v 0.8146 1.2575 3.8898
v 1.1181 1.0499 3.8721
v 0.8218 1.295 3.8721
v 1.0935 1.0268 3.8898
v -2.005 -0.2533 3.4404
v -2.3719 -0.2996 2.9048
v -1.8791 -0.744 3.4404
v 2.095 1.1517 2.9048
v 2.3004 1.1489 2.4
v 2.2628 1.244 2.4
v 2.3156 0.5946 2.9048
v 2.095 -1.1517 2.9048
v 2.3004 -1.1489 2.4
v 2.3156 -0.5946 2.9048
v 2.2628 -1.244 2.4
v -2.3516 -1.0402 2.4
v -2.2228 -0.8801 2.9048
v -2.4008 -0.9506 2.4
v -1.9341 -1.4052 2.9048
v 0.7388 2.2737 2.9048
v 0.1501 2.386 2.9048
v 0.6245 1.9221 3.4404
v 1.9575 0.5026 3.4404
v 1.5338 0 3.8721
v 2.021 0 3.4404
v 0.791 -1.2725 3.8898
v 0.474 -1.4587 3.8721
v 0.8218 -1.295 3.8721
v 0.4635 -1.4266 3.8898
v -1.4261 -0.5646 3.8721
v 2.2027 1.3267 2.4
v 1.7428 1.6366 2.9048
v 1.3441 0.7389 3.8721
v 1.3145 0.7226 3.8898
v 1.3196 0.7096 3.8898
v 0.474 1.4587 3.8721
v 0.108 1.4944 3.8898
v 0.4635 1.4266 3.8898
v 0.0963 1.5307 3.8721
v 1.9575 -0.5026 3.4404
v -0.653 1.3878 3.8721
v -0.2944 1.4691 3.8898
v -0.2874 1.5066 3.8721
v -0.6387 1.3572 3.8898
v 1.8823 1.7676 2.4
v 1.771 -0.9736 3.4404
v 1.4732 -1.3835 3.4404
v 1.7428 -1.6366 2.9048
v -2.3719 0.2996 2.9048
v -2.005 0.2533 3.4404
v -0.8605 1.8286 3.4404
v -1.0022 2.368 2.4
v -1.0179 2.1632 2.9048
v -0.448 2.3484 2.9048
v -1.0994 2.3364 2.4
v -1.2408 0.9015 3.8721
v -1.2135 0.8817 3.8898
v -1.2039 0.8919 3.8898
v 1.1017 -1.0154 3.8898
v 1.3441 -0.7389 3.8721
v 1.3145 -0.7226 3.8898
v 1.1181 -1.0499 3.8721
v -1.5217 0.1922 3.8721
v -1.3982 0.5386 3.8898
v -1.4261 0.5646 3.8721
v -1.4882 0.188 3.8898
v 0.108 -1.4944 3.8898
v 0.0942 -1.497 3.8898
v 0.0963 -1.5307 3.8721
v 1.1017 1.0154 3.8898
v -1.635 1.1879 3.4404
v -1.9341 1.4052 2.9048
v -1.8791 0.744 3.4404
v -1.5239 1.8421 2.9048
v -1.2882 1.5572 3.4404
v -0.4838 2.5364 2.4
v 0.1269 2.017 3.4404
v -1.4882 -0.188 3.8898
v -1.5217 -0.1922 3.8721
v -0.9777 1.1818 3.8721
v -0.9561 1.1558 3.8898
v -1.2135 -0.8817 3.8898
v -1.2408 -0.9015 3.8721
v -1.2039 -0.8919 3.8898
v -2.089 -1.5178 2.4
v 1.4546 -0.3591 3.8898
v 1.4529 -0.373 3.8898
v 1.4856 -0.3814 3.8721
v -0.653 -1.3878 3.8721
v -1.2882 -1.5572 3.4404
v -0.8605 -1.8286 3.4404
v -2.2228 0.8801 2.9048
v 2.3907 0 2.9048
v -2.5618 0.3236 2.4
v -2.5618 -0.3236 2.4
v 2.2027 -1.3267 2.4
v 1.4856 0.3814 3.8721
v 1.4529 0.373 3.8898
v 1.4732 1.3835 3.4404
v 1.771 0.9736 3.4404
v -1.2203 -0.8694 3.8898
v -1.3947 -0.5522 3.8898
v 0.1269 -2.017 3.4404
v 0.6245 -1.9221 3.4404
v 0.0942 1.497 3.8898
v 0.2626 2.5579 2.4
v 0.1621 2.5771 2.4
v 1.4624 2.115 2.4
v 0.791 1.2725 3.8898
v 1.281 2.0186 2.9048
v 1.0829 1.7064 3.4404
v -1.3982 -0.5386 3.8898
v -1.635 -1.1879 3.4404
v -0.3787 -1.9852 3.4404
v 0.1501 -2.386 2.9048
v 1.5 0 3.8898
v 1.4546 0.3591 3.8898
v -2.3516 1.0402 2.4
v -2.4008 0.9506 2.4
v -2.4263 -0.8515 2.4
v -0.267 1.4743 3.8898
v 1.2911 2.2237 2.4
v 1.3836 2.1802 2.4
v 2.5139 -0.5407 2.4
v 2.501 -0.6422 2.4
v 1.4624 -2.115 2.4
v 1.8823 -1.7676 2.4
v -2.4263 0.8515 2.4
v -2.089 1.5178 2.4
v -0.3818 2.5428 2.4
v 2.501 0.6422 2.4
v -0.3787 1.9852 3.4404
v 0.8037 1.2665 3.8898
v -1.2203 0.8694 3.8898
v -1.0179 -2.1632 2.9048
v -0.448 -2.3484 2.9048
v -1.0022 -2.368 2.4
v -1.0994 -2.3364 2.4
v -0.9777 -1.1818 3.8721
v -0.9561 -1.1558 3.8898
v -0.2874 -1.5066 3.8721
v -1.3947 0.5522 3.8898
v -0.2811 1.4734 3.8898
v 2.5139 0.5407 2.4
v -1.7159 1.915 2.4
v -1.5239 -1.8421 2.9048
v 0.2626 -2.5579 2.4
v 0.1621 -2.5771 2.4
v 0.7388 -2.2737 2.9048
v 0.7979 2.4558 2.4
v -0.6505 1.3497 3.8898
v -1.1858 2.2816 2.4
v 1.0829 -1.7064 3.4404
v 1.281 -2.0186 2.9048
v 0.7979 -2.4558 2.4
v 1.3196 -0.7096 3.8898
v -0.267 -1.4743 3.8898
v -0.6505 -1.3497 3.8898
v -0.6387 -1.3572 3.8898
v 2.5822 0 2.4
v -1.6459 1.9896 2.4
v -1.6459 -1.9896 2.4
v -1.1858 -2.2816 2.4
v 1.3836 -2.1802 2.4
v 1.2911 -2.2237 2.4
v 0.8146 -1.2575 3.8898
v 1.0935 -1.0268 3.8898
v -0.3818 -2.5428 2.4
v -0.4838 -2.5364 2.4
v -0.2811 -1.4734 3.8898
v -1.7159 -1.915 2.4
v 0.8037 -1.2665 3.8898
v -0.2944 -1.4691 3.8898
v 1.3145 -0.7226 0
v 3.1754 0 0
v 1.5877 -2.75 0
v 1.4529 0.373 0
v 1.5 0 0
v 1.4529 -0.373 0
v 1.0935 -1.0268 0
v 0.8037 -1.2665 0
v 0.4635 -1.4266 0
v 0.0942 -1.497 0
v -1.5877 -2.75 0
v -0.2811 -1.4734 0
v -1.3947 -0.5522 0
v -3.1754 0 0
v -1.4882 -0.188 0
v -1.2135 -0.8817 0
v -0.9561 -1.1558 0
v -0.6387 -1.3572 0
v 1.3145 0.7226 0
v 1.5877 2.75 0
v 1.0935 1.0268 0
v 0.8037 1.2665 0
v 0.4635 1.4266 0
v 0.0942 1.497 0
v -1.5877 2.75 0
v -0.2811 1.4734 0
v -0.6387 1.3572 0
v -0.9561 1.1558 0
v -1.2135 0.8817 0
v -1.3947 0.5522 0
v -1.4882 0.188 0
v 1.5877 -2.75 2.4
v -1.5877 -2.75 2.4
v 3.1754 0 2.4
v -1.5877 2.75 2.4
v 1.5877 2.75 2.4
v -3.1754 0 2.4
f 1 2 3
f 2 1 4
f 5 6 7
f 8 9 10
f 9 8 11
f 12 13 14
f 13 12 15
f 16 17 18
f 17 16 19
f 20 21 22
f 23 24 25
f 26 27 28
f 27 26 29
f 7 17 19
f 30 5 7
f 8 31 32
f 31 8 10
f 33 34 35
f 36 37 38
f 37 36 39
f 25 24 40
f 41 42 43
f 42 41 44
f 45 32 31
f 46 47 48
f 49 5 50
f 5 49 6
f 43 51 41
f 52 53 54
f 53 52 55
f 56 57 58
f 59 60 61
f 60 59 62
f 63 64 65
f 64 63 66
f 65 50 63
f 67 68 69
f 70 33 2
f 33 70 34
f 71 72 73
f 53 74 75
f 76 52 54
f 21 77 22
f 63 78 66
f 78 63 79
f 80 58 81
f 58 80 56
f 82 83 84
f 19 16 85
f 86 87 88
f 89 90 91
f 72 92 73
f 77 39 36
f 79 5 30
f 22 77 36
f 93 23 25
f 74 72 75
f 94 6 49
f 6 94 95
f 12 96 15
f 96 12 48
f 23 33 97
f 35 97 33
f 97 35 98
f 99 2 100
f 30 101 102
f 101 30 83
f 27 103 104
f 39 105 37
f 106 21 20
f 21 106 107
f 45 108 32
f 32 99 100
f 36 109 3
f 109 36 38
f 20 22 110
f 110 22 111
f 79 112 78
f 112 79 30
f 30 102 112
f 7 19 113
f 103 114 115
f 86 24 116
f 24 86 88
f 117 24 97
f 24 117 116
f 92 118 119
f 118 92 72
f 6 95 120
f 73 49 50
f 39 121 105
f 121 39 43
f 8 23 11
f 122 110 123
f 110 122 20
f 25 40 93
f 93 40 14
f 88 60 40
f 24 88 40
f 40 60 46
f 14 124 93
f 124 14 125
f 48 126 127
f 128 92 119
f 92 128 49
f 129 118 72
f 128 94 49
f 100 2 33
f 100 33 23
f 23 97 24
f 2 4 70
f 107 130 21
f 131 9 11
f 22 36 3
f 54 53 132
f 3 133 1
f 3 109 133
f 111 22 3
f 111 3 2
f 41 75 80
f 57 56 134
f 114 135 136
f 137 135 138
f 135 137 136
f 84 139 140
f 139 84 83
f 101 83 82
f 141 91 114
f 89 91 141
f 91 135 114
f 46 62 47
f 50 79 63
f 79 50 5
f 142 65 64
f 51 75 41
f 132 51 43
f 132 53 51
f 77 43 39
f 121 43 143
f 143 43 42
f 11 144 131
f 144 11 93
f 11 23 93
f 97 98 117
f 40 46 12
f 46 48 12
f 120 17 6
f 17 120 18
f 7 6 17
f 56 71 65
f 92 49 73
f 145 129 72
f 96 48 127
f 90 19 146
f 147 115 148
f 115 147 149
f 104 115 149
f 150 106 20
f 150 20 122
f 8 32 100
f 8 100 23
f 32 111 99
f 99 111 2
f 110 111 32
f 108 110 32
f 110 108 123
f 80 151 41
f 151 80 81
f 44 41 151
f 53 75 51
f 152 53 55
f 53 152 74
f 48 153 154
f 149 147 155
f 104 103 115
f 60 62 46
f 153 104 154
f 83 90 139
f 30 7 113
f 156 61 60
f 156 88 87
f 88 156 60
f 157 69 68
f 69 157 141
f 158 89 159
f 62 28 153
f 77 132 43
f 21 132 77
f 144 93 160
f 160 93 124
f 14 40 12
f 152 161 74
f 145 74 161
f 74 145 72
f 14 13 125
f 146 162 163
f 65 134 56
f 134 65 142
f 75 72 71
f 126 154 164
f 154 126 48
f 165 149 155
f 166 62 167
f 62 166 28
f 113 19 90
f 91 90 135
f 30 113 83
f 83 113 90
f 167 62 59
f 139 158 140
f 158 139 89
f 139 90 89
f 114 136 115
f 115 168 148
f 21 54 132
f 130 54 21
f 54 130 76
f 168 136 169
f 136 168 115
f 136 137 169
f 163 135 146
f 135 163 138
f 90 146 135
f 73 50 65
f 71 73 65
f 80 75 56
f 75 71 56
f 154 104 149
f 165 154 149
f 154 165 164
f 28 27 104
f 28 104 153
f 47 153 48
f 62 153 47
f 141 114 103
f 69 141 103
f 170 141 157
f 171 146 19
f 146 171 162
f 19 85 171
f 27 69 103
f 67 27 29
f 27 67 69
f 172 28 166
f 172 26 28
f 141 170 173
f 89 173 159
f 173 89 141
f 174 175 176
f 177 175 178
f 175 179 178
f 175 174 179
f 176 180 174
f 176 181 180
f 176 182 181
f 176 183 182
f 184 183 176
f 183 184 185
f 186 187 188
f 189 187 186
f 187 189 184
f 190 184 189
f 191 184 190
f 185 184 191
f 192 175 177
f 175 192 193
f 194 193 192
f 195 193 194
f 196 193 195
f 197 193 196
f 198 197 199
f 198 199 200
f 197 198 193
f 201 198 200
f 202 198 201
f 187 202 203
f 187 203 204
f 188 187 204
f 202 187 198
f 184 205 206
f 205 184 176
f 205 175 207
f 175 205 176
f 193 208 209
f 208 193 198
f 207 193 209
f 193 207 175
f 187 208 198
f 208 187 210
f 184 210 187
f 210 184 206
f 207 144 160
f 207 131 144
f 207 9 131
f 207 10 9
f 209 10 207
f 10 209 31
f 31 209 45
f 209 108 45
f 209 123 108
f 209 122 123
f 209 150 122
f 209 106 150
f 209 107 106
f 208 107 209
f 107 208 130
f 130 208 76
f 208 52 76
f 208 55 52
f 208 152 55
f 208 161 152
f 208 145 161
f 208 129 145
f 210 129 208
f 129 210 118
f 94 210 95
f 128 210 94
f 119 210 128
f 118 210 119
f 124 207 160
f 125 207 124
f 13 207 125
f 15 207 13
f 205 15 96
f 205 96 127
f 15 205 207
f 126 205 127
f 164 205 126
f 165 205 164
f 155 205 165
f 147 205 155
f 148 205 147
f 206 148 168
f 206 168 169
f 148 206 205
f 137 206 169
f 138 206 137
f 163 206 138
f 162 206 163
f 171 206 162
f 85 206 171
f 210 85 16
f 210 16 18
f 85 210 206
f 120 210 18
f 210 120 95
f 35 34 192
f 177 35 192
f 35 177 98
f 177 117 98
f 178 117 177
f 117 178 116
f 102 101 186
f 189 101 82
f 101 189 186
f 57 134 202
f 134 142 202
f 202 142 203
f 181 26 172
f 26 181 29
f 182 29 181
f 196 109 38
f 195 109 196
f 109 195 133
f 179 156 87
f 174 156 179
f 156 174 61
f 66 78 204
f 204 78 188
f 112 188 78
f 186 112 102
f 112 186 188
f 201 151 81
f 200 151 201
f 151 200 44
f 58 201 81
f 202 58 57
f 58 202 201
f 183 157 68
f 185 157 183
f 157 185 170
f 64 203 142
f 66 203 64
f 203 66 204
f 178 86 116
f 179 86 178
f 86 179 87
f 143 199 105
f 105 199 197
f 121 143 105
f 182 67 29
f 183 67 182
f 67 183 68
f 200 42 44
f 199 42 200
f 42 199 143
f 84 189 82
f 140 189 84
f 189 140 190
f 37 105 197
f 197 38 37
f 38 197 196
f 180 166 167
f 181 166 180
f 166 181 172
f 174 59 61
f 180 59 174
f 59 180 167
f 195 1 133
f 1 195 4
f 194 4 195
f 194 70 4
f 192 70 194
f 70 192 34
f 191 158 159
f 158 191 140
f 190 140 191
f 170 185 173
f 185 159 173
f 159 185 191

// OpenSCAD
/* 
    DIN985
*/

$fn = 25;

DIN985(3);
module DIN985(gwint)
{
    //Parametry nakrętki:
    {
        //grubość
        function m(gwint) = lookup(gwint, [[3,2.4],[4,3.2],[5,4],[6,5],[8,6.5],[10,17],[12,19],[14,22],[16,24],[18,27],[20,30]]);
        m=m(gwint);
        //szerokość
        function s(gwint) = lookup(gwint, [[3,5.5],[4,7],[5,8],[6,10],[8,13],[10,6.2],[12,7.44],[14,8.4],[16,8.8],[20,10.16]]);
        s=s(gwint);
        //Definicja kolorów
        aluminum = [0.9, 0.9, 0.9];
        steel = [0.8, 0.8, 0.9];
    }
    
{
    color(steel,1)
	difference()
	{
        union(){
		cylinder(d = s*2/sqrt(3),h = m, $fn=6);
            difference(){
        translate ([0,0,gwint*0.55]) sphere(gwint*0.9);
    translate([0, 0, -1]) cube([20, 20, 2], center=true);
            }
        }
		translate([0,0,-0.1])	cylinder(r = gwint/2, h = m + 50);
	}
    
}

}
